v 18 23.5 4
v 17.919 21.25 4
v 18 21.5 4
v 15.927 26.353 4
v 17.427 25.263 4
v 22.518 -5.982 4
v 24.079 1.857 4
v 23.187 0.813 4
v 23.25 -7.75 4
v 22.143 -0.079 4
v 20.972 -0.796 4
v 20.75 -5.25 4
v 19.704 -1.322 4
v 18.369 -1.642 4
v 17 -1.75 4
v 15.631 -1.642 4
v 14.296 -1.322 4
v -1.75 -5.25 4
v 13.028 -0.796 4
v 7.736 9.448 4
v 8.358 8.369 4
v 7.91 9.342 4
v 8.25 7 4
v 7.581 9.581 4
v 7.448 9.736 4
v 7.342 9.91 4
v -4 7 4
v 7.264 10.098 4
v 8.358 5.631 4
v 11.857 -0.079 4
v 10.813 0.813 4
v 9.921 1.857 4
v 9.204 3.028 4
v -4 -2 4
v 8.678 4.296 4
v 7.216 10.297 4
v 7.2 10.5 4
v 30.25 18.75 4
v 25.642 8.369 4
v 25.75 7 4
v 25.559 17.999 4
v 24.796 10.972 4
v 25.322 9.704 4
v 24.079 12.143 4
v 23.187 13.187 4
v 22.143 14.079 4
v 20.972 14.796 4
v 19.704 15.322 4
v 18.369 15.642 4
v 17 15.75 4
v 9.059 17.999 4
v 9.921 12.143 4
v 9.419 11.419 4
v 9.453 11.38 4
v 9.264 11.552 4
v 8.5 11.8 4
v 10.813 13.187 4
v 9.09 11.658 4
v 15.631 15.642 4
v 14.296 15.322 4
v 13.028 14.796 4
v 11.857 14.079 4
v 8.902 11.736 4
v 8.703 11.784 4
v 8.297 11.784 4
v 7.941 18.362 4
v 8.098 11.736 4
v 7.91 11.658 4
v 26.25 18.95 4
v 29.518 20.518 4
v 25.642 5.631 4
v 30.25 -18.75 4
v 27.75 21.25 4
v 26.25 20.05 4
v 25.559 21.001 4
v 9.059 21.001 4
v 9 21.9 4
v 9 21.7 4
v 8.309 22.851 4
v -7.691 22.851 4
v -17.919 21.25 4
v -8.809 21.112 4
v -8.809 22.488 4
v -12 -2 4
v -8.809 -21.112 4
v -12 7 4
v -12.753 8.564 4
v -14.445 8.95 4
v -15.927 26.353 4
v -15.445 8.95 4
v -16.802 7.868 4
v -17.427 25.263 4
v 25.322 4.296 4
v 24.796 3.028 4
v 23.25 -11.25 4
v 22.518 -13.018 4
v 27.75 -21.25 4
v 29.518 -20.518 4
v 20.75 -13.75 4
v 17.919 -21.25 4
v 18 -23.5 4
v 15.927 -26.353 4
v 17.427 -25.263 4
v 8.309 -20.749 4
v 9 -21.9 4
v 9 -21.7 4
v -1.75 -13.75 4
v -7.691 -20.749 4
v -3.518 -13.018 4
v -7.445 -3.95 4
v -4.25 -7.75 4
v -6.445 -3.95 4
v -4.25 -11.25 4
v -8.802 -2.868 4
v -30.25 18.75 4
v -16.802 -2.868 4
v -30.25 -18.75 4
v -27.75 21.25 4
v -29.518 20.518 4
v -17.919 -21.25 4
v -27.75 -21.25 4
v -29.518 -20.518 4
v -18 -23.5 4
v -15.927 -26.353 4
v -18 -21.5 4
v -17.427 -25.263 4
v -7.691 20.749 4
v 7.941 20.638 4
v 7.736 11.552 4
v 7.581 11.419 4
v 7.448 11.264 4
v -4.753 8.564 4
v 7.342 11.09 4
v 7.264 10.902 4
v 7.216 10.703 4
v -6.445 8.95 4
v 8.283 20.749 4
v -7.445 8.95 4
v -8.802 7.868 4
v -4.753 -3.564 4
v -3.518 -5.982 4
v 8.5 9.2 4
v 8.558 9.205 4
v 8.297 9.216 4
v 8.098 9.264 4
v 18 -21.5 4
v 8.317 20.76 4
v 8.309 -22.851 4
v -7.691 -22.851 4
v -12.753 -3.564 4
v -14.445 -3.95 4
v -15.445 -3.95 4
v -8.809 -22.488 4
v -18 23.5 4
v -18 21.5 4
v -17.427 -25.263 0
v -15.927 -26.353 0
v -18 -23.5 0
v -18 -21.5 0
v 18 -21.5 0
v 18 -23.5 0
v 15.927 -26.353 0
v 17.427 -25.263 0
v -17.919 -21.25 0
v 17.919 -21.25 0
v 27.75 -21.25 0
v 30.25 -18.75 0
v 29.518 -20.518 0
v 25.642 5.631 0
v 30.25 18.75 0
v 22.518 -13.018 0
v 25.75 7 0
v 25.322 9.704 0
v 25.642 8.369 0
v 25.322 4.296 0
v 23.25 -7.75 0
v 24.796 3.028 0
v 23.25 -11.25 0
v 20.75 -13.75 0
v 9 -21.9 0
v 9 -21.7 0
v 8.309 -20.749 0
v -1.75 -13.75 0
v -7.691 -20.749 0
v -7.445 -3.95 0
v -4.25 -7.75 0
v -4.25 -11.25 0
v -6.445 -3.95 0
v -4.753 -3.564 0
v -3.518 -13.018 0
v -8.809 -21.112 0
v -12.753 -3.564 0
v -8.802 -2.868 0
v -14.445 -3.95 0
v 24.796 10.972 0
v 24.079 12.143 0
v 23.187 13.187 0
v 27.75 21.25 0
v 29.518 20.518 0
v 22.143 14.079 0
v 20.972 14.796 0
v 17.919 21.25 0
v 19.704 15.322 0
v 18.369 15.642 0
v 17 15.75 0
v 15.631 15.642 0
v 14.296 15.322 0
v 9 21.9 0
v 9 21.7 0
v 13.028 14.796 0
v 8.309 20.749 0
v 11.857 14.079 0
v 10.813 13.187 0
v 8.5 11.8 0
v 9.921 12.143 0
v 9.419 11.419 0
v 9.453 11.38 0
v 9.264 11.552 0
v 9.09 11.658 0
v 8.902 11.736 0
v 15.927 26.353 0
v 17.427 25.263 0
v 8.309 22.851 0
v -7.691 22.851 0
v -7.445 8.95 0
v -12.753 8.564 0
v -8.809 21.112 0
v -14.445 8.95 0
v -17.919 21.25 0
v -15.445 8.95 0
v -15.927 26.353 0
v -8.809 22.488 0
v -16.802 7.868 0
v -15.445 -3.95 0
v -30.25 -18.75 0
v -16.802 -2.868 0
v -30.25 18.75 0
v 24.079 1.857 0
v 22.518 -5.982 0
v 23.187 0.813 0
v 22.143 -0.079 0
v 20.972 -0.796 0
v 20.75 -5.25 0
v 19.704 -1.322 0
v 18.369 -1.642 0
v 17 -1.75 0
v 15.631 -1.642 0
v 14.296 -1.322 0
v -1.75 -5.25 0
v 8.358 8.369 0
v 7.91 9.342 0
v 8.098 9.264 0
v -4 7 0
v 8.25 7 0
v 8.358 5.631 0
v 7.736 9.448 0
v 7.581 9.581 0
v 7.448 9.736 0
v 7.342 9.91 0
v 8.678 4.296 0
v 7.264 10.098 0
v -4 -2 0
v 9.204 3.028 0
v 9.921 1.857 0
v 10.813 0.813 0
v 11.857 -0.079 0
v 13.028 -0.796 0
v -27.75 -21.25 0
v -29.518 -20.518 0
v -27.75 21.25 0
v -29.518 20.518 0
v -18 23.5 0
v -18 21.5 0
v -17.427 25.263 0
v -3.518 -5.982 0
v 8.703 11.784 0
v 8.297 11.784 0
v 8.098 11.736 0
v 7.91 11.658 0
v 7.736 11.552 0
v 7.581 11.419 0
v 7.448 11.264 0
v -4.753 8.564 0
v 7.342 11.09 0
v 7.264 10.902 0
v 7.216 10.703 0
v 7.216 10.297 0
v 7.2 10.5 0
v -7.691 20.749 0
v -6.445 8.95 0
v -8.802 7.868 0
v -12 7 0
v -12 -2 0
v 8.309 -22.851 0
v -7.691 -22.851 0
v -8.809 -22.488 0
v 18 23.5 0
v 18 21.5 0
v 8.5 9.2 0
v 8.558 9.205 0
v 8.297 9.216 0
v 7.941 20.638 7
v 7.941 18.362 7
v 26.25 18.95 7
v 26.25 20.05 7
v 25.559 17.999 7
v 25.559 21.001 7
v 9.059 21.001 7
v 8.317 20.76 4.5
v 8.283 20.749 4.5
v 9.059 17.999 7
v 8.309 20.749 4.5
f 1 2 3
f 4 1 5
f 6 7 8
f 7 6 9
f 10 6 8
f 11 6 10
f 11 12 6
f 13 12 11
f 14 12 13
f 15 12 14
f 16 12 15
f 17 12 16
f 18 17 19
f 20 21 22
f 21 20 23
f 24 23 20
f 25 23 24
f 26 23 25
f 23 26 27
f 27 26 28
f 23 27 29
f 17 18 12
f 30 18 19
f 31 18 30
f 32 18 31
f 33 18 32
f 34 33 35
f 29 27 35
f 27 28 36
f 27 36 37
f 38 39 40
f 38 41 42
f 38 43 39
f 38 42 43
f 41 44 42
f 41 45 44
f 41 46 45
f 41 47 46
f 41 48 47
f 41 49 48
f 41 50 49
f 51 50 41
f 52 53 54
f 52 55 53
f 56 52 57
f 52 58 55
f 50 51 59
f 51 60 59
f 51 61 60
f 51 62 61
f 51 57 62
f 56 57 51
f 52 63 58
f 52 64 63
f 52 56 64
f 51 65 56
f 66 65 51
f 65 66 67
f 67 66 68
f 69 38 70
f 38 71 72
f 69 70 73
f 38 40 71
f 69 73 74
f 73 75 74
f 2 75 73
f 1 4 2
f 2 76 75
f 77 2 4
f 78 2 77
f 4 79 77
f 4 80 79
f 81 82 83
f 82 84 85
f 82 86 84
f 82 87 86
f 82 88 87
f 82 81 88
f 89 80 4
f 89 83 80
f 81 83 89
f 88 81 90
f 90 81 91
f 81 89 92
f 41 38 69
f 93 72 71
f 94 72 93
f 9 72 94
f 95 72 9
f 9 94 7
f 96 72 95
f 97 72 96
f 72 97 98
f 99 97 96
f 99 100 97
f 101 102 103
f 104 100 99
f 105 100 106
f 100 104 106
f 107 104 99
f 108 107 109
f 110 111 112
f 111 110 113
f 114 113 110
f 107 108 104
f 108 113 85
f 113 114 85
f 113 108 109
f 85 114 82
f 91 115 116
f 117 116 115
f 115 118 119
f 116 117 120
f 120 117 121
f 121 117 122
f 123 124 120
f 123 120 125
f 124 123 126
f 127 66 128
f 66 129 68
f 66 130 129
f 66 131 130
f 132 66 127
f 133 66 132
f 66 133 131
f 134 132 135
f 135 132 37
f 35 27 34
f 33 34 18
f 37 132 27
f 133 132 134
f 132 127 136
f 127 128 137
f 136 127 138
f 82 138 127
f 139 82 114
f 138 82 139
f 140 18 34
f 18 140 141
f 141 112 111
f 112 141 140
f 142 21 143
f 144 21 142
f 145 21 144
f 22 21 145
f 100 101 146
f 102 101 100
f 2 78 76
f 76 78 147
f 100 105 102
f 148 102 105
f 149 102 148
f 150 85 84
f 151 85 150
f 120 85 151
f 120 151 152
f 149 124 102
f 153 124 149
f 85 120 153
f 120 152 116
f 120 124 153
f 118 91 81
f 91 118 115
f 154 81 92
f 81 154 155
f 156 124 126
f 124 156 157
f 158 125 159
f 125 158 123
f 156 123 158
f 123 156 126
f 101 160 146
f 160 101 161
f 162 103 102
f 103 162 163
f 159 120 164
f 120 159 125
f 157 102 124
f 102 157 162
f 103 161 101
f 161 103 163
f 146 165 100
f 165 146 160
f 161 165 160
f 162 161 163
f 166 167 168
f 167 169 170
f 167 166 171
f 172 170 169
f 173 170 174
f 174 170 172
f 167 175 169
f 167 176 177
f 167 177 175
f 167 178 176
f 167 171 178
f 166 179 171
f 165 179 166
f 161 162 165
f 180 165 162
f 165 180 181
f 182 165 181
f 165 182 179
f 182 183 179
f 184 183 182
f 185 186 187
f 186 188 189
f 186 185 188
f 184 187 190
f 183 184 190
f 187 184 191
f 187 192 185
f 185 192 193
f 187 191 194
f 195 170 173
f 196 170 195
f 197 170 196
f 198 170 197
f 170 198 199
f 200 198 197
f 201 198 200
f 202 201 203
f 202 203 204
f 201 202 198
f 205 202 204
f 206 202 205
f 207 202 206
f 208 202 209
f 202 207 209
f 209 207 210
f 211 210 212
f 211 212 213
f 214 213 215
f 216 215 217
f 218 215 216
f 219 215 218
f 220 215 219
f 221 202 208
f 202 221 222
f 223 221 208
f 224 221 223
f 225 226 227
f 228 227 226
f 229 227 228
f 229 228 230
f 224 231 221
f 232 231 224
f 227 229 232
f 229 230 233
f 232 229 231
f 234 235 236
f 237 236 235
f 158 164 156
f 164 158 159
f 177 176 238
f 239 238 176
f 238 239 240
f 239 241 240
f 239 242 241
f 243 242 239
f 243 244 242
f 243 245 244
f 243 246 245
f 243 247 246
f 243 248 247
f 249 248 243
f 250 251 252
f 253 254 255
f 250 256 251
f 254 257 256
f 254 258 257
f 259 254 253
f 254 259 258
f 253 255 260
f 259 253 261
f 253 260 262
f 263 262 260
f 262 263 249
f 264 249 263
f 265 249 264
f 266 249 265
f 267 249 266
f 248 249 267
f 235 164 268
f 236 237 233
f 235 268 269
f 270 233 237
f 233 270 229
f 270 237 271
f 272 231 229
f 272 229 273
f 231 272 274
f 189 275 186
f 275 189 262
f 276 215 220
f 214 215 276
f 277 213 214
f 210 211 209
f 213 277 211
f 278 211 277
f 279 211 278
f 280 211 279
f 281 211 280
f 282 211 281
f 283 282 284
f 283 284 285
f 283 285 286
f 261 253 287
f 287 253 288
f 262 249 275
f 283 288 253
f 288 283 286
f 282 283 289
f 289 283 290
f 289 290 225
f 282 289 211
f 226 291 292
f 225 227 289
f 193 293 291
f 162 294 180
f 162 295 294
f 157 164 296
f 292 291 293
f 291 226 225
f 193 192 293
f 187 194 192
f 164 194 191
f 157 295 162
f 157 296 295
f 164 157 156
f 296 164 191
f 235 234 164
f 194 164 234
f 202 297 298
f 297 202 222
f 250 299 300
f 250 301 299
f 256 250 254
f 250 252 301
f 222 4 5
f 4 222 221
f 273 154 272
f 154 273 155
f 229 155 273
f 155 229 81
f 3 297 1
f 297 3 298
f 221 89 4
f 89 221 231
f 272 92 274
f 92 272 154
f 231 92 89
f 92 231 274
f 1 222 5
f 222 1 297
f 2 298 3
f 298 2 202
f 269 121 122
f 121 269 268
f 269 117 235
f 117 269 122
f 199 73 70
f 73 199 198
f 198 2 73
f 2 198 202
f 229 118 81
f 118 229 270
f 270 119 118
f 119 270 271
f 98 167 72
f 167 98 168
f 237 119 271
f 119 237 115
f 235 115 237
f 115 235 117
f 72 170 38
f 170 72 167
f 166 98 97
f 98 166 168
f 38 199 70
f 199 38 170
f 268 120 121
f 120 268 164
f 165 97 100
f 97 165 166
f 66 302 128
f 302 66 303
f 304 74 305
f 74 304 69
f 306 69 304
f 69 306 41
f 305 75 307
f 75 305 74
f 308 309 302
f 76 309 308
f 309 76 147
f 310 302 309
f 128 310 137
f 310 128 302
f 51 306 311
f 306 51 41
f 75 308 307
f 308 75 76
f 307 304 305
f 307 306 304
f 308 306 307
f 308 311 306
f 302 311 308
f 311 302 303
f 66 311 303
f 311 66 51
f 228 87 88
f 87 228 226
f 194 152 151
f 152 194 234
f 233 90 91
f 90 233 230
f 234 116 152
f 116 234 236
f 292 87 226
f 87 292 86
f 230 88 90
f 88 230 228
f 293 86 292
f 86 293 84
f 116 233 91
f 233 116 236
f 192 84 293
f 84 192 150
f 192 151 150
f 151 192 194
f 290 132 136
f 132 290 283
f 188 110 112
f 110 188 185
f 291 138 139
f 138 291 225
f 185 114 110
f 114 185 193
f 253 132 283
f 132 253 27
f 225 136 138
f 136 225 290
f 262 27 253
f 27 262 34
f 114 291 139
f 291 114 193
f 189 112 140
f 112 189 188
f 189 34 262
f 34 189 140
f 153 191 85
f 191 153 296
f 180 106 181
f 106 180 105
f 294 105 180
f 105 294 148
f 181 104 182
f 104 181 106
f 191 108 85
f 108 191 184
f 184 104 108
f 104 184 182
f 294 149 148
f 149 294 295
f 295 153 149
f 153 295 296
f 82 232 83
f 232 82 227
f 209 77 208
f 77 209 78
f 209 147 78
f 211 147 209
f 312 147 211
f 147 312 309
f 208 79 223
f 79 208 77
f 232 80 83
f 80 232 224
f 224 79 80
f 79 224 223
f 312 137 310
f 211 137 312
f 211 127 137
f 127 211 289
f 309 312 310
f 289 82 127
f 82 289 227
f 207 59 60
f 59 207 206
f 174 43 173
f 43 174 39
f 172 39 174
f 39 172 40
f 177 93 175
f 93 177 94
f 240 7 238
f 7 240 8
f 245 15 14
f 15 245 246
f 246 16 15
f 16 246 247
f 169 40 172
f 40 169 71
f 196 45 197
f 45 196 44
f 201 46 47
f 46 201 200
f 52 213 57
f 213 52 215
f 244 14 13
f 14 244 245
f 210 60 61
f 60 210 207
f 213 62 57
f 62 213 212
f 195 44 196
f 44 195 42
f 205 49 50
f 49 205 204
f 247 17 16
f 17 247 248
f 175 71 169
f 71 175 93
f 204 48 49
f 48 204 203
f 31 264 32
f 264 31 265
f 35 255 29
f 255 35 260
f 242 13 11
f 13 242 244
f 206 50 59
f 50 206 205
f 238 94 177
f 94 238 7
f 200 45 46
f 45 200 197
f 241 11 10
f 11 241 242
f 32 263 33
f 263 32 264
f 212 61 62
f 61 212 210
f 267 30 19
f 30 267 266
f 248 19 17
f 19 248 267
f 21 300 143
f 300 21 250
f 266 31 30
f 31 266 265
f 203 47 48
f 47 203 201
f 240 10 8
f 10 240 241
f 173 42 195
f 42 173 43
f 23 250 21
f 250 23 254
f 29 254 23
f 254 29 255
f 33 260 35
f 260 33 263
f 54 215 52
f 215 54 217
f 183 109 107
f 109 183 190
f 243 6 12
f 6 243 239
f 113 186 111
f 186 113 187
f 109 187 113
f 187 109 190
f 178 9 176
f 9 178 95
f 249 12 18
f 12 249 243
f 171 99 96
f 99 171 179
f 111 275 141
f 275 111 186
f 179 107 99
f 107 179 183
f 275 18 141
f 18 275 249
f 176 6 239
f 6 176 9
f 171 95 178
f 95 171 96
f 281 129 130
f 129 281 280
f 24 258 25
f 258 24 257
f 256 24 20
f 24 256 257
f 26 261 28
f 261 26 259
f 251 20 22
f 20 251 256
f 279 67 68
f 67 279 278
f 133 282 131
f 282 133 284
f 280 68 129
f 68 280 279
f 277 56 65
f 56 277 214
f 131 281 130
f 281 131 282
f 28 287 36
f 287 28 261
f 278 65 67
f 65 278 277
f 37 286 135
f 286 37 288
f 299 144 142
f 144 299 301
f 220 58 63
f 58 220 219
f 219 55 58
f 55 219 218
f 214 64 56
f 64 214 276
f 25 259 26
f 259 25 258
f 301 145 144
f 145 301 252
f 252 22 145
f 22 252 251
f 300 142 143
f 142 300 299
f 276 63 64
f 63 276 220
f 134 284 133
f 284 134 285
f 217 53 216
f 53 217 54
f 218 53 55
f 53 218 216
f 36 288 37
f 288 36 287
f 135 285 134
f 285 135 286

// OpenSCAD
// file: dronePlates.scad
/**
 * dronePlates.scad
 * Plate library
 *
 * GNU GPL V3
 * @author: Victor Potenciano
 */

m3Rad = 3.4/2;
cornerR = 4;

/**
 *
 */
module helperDisk(diameter) {
	cylinder(r = diameter/2, h = 0.6, $fn=20);
}

/**
 *
 */
module roundedRect(size, radius) {
	x = size[0];
	y = size[1];
	z = size[2];

	linear_extrude(height=z)
	hull() {
	// place 4 circles in the corners, with the given radius
	translate([(-x/2)+(radius/2), (-y/2)+(radius/2), 0]){ circle(r=radius); }
	translate([(x/2)-(radius/2), (-y/2)+(radius/2), 0]){ circle(r=radius); }
	translate([(-x/2)+(radius/2), (y/2)-(radius/2), 0]){ circle(r=radius); }
	translate([(x/2)-(radius/2), (y/2)-(radius/2), 0]){ circle(r=radius); }
	}
}

/**
 * rounded rectangle triangle with corner at origin
 */
module roundedTriangle(size, radius) {
	x = size[0];
	y = size[1];
	z = size[2];

	linear_extrude(height=z)
	hull() {
	translate([radius, radius, 0]){ circle(r=radius); }
	translate([x-radius, radius, 0]){ circle(r=radius); }
	translate([radius, y-radius, 0]){ circle(r=radius); }
	}
}

/**
 *
 */
module roundRectPlate(w, l, plateThick=3) {
	difference(){
		roundedRect([l+m3Rad*1.75,w+m3Rad*1.75,plateThick], cornerR);
		translate([l/2, w/2, -0.5]) { cylinder(h = plateThick+1, r = m3Rad, $fn=30); }
		translate([-l/2, w/2, -0.5]) { cylinder(h = plateThick+1, r = m3Rad, $fn=30); }
		translate([l/2, -w/2, -0.5]) { cylinder(h = plateThick+1, r = m3Rad, $fn=30); }
		translate([-l/2, -w/2, -0.5]) { cylinder(h = plateThick+1, r = m3Rad, $fn=30); }
	}
}

/**
 *
 */
module crossSquarePlate(l, thick=3) {
	inDist = cornerR*2+4;
	trianL = sqrt((l*l)/2)-inDist;
	centerR = 4;

	difference(){
		roundRectPlate(l, l, thick);
		translate([0, centerR, -0.5]) { 
			rotate([0,0,45]){ roundedTriangle([trianL,trianL,thick+1], cornerR-2); }
		}
		translate([0, -centerR, -0.5]) { 
			rotate([0,0,225]){ roundedTriangle([trianL,trianL,thick+1], cornerR-2); }
		}
		translate([-centerR, 0, -0.5]) { 
			rotate([0,0,135]){ roundedTriangle([trianL,trianL,thick+1], cornerR-2); }
		}
		translate([centerR, 0, -0.5]) { 
			rotate([0,0,-45]){ roundedTriangle([trianL,trianL,thick+1], cornerR-2); }
		}
	}
}

/**
 *
 */
module hShapePlate(w, l, thick=4) {
	inDist = cornerR*2+1;

	difference(){
		roundRectPlate(w, l, thick);
		translate([0, w/4, -0.5]) { roundedRect([l-inDist,w/2-inDist,thick+1], cornerR-2); }
		translate([0, -w/4, -0.5]) { roundedRect([l-inDist,w/2-inDist,thick+1], cornerR-2); }
	}
}

/**
 *
 */
module motorCircleMount(inDia, outDia, thick=3, extraH=false, d1=19, d2=16, holeR=m3Rad ) {
	difference(){
		cylinder(h = thick, r = outDia/2, $fn=30);
		motorCircleMountHoles(inDia, outDia, thick, extraH, d1=d1, d2=d2, holeR=holeR);
	}
}

/**
 *
 */
module motorCircleMountHoles(inDia, outDia, thick=3, extraH=false, d1=19, d2=16, d3=25, holeR=m3Rad) {
	translate([0, 0, -0.5]) { cylinder(h = thick+1, r = inDia/2, $fn=30); }

	for(i=[0:3]) {
		rotate([0,0,90*i]){
		translate([d1/2, 0, -0.5]) cylinder(h = thick+1, r = holeR, $fn=20);
		translate([d2/2, 0, -0.5]) cylinder(h = thick+1, r = holeR, $fn=20);
		translate([d2/2, -holeR, -0.5]) cube(size = [(d1-d2)/2,holeR*2,thick+1]);
		}
	}
	
	if(extraH==true){	
		for(i=[-1,1]) translate([i*d3/2, 0, -0.5]) { cylinder(h = thick+1, r = holeR, $fn=30); }
	}
}

/**
 *
 */
module motorRectMount(w, l, inDia, thick=3) {
	d1=19;
	d2=16;

	difference(){
		roundRectPlate(w, l, thick);
		translate([0, 0, -0.5]) { cylinder(h = thick+1, r = inDia/2, $fn=30); }
		translate([0, d1/2, -0.5]) { cylinder(h = thick+1, r = m3Rad, $fn=30); }
		translate([0, -d1/2, -0.5]) { cylinder(h = thick+1, r = m3Rad, $fn=30); }
		translate([d2/2, 0, -0.5]) { cylinder(h = thick+1, r = m3Rad, $fn=30); }
		translate([-d2/2, 0, -0.5]) { cylinder(h = thick+1, r = m3Rad, $fn=30); }
	}
}

/**
 *
 */
module tube(inDia, outDia, height) {
	difference(){
		cylinder(h = height, r = outDia/2, $fn=50);
		translate([0, 0, -0.5]) { cylinder(h = height+1, r = inDia/2, $fn=30); }
	}
}

/**
 *
 */
module squareTube(inDia, outDia, height) {
	translate([0,0,height/2]){
	difference(){
		cube(size = [outDia,outDia,height], center = true);
		cube(size = [inDia,inDia,height+1], center = true);
	}
	}
}

/**
 *
 */
module djiFlamewheelHoles(height) {
	a = 23;
	b = 16;
	c = 19.5;
	
	translate([a/2, c/2, 0]) { cylinder(h = height, r = m3Rad, $fn=30); }
	translate([-a/2, c/2, 0]) { cylinder(h = height, r = m3Rad, $fn=30); }
	translate([b/2, -c/2, 0]) { cylinder(h = height, r = m3Rad, $fn=30); }
	translate([-b/2, -c/2, 0]) { cylinder(h = height, r = m3Rad, $fn=30); }
}

/**
 *
 */
module djiFlamewheelHolesBotton(height) {
	a1 = 21;
	c = 19.5;
	
	translate([a1/2, c/2, 0]) { cylinder(h = height, r = m3Rad, $fn=30); }
	translate([-a1/2, c/2, 0]) { cylinder(h = height, r = m3Rad, $fn=30); }
}

/**
 *
 */
module propeller(size){
union(){
difference(){
	cylinder(h = 3, r = size/2, center=true, $fn=30);
	cylinder(h = 3.1, r = size/2-2, center=true, $fn=30); 
}
for( i = [-1,1] ){
rotate([0,0,45*i]){ cube(size = [size,4,1], center = true); }
}
}
}

/**
 *
 */
module slot(length, height, rad){
for(i=[-1,1]) translate([i*length/2,0,0]) cylinder(h = height, r = rad, $fn=30);
translate([0,0,height/2]) cube(size = [length,rad*2,height], center = true);
}

 

////////////////////////
// Examples:
////////////////////////

motorCircleMount(8, 25, 3.5);

//roundedRect([50,50,3], 4);

//hShapePlate(79, 25);

//rotate([0,0,45]){roundedTriangle([40,40,3], 4);}

//crossSquarePlate(45, 4);

/*
union(){
motorRectMount(21, 18, 8, 4);
translate([9, 10.5, 0]) {tube(m3Rad*2, 6.5, 6);}
}
*/

/*
difference(){
union(){
hShapePlate(50, 30, 3.5);
translate([-4,-25,0]){cube(size = [8,50,3.5]);}
rotate([0, 0, 45]) {motorCircleMount(8, 35, 3.5);}
}
cylinder(h = 10, r = 4, $fn=100, center=true);
}
*/

//rotate([90,0,0]){ tube(5,10,20); }
//translate([20,0,0]){ squareTube(5, 10, 20); }
// main file
/**
 * MoPro protector
 *
 */

use <dronePlates.scad>

camW = 59;
camH = 41;
thick = 4;

lensCx = 12.5;
lensCy = 13.5;
lensRad = 17.5/2;


//color("lightblue"){
//translate([0,0,-1]) cube([camW,camH,2], center=true);
//}

difference(){
    union(){
        roundedRect([camW-1,camH-1,thick], 2.5);
        translate([camW/2-lensCx,camH/2-1,0]) roundedRect([lensRad*2,2.1,thick+3], 1);
        for(i=[-1,1] ){
            translate([0,i*(camH/2+2),0]) roundedRect([33, 5, thick], 3);
        }
    }
    
    //lens hole
    translate([camW/2-lensCx,camH/2-lensCy,-0.5]) cylinder(r=lensRad, h=thick+1, $fn=40);
    
    //buttons hole
    translate([camW/2-20,camH/2-30,-0.5]) roundedRect([25,6,thick+1],2.5);
    
    //heatsink
    for(i=[-1,1]){
    translate([(camW/2-40)+i*4,camH/2-18,-0.5]) roundedRect([3,11,thick+1],2);
    }
    
    //led hole
    translate([camW/2-21,camH/2-10,-0.5]) cylinder(r=1.3, h=thick+1, $fn=40);
    
    //velcro strap holes
    for(i=[-1,1]){
    translate([0,i*(camH/2+1.3),-0.5]) roundedRect([17,1.2,thick+1],1);
    }
}
